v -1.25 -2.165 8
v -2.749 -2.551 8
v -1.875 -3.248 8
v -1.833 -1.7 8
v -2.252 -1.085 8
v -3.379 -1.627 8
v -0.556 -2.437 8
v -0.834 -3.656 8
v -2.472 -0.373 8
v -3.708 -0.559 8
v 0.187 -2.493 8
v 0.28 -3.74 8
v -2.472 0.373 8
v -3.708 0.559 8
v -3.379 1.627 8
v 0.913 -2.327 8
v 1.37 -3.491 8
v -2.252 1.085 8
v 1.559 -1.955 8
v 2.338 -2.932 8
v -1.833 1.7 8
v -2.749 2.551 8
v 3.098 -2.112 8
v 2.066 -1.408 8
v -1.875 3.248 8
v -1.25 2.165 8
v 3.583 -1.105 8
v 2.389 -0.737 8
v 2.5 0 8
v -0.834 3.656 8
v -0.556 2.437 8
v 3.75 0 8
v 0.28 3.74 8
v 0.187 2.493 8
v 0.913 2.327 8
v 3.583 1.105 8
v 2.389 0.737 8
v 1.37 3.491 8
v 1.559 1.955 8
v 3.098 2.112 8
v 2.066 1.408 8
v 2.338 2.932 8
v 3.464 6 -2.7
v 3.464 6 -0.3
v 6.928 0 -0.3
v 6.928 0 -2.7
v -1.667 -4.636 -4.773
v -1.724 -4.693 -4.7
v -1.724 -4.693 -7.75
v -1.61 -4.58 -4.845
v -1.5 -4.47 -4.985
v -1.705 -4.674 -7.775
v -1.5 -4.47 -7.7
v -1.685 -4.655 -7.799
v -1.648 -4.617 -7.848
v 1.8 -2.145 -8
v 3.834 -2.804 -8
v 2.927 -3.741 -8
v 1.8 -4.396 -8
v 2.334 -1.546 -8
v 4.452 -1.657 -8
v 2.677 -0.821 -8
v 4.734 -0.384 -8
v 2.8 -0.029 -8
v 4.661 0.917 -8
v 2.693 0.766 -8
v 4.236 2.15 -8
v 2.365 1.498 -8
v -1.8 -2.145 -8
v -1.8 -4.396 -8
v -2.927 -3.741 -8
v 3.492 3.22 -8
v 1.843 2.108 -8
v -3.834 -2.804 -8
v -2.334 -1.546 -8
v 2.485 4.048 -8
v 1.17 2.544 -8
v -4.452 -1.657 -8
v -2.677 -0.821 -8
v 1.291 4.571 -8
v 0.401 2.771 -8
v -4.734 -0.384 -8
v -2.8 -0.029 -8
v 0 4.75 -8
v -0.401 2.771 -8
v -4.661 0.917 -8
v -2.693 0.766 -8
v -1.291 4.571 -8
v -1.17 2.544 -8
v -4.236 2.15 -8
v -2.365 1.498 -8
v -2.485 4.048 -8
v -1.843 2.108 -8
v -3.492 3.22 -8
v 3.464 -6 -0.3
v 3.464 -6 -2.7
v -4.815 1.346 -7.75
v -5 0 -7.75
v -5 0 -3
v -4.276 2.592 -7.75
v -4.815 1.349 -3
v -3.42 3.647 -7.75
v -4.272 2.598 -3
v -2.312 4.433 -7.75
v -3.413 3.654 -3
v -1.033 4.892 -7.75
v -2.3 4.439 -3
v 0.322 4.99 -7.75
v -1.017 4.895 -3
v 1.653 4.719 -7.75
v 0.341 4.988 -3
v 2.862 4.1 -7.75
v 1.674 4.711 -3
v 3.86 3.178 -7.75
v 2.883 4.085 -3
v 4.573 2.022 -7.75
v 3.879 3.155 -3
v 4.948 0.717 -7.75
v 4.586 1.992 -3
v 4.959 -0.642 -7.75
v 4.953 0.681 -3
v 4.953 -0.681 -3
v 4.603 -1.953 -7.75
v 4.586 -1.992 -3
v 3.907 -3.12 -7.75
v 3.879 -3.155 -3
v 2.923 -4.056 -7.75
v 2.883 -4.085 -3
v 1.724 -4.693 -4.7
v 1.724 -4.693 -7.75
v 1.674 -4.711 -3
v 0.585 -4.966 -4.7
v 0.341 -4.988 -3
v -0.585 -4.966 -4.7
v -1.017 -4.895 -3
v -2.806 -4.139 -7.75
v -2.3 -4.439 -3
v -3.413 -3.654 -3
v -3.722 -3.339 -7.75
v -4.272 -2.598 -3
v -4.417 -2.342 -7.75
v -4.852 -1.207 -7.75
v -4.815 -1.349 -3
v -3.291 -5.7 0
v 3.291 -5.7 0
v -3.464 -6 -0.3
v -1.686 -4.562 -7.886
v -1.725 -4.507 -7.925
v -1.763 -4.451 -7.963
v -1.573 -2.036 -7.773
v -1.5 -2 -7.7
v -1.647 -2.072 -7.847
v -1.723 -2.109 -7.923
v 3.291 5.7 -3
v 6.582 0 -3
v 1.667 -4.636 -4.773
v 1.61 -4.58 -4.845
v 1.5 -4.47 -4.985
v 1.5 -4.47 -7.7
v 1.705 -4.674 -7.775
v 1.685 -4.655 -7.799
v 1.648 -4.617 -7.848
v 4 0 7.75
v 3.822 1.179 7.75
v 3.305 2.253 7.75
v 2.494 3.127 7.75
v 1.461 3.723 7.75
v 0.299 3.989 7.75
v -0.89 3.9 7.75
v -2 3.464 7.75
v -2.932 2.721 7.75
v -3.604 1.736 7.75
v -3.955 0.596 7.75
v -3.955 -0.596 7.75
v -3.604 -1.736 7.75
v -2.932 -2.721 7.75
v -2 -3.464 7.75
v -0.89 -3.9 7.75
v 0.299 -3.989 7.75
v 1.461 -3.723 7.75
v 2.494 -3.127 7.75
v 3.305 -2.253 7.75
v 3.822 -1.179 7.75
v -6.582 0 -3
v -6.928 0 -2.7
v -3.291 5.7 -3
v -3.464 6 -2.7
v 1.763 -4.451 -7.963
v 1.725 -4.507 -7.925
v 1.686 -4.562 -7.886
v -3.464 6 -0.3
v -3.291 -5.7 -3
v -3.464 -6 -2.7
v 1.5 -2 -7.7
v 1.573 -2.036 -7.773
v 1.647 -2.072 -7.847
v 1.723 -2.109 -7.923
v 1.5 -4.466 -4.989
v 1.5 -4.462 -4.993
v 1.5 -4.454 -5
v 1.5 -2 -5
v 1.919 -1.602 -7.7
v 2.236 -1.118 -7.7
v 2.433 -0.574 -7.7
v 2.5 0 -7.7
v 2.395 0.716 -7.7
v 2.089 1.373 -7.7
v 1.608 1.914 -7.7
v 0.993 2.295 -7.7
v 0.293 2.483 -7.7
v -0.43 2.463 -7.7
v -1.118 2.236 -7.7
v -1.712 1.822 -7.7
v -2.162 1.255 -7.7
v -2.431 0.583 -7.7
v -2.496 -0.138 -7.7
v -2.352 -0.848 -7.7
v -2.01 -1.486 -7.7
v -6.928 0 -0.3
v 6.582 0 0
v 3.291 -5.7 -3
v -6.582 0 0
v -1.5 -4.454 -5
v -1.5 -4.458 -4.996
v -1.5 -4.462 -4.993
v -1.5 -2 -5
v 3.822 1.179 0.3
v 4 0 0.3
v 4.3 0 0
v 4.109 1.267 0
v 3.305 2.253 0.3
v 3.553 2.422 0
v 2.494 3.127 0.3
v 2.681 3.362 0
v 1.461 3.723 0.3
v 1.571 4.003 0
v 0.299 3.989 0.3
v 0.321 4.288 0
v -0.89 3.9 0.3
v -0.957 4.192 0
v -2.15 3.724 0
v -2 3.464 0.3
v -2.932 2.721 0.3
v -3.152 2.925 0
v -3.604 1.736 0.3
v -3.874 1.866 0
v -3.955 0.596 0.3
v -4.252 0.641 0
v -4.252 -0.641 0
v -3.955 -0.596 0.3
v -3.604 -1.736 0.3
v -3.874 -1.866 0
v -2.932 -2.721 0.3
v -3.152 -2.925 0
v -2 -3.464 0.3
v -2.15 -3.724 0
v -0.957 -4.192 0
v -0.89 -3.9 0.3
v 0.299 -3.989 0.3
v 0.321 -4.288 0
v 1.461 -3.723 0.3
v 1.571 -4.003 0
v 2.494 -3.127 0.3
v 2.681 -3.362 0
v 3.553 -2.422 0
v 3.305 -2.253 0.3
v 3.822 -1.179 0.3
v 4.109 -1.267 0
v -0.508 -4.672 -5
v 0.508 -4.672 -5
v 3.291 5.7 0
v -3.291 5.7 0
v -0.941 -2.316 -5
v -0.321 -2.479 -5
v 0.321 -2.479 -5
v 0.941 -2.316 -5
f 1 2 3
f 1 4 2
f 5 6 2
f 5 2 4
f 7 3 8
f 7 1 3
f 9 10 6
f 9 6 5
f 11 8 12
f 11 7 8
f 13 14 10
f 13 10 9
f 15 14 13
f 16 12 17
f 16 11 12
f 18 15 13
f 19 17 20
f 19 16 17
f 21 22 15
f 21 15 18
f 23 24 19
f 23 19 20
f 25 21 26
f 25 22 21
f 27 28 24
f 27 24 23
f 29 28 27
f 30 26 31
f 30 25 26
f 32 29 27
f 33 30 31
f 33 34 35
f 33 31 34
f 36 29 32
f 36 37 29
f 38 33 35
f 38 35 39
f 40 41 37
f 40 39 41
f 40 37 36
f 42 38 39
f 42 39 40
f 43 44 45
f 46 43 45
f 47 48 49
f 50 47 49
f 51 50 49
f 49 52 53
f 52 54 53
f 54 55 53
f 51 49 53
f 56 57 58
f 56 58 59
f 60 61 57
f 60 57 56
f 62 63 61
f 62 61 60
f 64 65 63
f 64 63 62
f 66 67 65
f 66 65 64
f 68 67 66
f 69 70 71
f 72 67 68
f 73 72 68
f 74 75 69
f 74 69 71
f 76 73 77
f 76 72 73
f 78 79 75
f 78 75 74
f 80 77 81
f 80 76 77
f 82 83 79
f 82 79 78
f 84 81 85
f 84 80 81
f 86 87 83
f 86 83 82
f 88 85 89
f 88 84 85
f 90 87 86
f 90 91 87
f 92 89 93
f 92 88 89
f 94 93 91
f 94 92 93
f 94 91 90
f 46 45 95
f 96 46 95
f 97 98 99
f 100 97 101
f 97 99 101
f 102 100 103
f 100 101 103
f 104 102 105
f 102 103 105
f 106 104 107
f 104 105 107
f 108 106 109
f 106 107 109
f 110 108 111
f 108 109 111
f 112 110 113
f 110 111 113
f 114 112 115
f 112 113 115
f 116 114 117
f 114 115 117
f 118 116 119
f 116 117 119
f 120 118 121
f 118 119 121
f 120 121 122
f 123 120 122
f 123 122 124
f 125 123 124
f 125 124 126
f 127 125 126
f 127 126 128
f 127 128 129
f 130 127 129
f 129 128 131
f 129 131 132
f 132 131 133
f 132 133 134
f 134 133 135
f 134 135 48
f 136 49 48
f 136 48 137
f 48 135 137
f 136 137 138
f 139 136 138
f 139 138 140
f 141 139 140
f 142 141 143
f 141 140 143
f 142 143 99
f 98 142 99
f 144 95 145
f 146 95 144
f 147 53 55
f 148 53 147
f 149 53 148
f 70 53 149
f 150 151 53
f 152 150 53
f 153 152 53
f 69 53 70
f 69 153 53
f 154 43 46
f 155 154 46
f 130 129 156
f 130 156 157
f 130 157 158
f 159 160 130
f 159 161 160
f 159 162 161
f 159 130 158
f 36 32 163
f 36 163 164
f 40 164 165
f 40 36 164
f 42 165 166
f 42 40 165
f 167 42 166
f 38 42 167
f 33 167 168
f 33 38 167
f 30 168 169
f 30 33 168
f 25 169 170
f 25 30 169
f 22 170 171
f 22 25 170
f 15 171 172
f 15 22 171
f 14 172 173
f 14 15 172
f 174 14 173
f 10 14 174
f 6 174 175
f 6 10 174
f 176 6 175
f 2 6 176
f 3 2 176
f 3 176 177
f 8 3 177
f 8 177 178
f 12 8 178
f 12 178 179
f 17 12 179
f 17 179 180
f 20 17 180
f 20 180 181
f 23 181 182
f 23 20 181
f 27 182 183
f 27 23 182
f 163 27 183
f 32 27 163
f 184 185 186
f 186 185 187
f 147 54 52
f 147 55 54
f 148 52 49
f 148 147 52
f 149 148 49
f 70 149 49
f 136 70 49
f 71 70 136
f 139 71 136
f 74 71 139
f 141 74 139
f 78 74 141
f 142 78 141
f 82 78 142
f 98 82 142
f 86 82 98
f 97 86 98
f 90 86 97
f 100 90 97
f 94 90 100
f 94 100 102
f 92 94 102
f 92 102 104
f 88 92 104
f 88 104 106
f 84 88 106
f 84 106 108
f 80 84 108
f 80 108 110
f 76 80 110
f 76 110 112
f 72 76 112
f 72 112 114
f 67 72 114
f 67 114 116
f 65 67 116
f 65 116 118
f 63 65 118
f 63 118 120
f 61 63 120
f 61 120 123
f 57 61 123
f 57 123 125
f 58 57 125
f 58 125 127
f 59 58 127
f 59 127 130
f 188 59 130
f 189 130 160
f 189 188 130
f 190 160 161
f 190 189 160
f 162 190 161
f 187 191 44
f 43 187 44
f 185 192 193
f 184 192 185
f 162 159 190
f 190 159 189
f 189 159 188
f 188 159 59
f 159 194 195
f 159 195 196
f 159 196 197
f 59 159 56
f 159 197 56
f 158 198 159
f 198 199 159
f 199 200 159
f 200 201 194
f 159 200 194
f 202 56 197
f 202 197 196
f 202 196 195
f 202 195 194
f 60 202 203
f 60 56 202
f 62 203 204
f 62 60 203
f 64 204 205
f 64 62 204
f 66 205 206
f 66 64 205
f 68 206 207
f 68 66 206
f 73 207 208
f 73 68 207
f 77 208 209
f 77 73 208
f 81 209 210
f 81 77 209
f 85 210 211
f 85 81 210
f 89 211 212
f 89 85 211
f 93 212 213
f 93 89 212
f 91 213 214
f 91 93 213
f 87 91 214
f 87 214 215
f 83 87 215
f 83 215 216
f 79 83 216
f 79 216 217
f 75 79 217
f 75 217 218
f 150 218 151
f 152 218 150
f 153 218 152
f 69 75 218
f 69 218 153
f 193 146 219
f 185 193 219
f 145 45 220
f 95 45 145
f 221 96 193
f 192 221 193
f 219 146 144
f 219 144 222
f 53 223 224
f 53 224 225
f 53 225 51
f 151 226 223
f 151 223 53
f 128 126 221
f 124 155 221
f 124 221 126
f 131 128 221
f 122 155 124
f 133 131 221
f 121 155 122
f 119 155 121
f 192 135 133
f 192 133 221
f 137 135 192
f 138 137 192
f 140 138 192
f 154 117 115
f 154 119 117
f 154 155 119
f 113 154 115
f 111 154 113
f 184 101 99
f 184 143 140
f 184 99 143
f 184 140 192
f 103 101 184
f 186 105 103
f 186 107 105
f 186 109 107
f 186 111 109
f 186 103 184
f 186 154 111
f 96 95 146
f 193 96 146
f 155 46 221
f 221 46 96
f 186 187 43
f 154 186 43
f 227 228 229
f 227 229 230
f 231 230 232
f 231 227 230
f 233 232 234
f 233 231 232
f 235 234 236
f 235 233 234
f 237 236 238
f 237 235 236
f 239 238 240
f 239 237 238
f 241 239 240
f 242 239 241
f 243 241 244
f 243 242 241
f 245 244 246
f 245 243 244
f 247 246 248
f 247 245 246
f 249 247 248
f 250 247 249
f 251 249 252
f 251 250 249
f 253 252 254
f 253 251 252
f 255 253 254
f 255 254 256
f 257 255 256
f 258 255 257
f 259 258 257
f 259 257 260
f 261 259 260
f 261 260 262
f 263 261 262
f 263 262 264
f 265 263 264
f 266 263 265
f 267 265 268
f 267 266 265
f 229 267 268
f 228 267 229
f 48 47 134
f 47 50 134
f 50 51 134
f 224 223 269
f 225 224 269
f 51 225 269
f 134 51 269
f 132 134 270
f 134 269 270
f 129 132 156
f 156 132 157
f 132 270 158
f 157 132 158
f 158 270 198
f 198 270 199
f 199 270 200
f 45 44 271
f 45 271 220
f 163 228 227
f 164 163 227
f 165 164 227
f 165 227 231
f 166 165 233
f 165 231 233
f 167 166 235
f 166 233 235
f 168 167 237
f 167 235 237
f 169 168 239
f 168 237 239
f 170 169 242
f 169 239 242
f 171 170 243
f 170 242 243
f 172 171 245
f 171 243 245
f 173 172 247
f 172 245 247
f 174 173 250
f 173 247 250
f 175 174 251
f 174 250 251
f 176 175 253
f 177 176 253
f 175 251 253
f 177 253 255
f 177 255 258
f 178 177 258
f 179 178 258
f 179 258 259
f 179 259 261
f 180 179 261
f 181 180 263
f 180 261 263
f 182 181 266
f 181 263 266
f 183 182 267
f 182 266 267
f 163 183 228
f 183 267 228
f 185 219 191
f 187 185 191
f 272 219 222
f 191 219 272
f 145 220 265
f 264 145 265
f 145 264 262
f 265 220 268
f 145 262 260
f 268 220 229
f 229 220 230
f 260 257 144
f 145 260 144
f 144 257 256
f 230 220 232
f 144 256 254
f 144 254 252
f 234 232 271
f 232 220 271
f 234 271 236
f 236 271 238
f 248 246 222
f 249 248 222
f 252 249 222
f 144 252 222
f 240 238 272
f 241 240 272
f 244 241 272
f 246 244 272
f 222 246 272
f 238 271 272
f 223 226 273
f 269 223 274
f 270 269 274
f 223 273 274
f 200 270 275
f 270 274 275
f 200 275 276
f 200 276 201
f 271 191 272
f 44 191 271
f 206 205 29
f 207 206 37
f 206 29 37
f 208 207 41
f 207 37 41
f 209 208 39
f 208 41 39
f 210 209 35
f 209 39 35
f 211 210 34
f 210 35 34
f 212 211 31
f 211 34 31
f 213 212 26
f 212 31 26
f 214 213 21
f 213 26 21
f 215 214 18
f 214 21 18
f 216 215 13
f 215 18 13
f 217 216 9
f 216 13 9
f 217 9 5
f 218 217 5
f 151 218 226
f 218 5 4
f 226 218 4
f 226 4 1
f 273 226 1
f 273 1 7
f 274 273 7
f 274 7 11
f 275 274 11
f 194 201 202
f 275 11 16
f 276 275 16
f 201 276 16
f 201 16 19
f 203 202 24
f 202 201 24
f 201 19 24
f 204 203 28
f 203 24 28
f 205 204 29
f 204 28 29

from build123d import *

# Parameters (mm, degrees)
SKETCH1_R           = 4
BOSS_EXTRUDE1_DEPTH = 8
BOSS_EXTRUDE2_DEPTH = 3
SKETCH3_R           = 5
BOSS_EXTRUDE3_DEPTH = 5
SKETCH4_R           = 2.5
CUT_EXTRUDE1_DEPTH  = 19.439088915
CHAMFER1_SIZE       = 0.3
CHAMFER2_SIZE       = 0.3
SKETCH5_W           = 3
SKETCH5_H           = 3
CUT_EXTRUDE2_DEPTH  = 13.165525061
CHAMFER3_SIZE       = 0.3
CHAMFER4_SIZE       = 0.3
CHAMFER5_SIZE       = 0.25


with BuildPart() as part:
    # Sketch1 → Boss-Extrude1 (new body)
    with BuildSketch(Plane.XY):
        Circle(SKETCH1_R)
    extrude(amount=BOSS_EXTRUDE1_DEPTH)

    # Sketch2 → Boss-Extrude2 (add)
    with BuildSketch(Plane(origin=(0, 0, 0), x_dir=(-1, 0, 0), z_dir=(0, 0, -1))):
        Polygon((-3.464101615, 6), (-6.92820323, 0), (-3.464101615, -6), (3.464101615, -6), (6.92820323, 0), (3.464101615, 6), align=None)
    extrude(amount=BOSS_EXTRUDE2_DEPTH)

    # Sketch3 → Boss-Extrude3 (add)
    with BuildSketch(Plane(origin=(0, 0, -3), x_dir=(-1, 0, 0), z_dir=(0, 0, -1))):
        Circle(SKETCH3_R)
    extrude(amount=BOSS_EXTRUDE3_DEPTH)

    # Sketch4 → Cut-Extrude1 (cut, through all)
    with BuildSketch(Plane.XY.offset(8)):
        Circle(SKETCH4_R)
    extrude(amount=-CUT_EXTRUDE1_DEPTH, mode=Mode.SUBTRACT)

    # Chamfer1
    chamfer1_edges = [part.edges().sort_by_distance(p)[0] for p in [
        (-4, 0, 0),
    ]]
    chamfer(chamfer1_edges, length=CHAMFER1_SIZE)

    # Chamfer2
    chamfer2_edges = [part.edges().sort_by_distance(p)[0] for p in [
        (-2.5, 0, -8),
    ]]
    chamfer(chamfer2_edges, length=CHAMFER2_SIZE)

    # Sketch5 → Cut-Extrude2 (cut, through all)
    with BuildSketch(Plane(origin=(0, 0, 0), x_dir=(1, 0, 0), z_dir=(0, 1, 0))):
        with Locations((0, 6.5)):
            Rectangle(SKETCH5_W, SKETCH5_H)
    extrude(amount=-CUT_EXTRUDE2_DEPTH, mode=Mode.SUBTRACT)

    # Chamfer3
    chamfer3_edges = [part.edges().sort_by_distance(p)[0] for p in [
        (-5.196152423, 3, -3),
        (0, 6, 0),
        (5.196152423, 3, 0),
        (5.196152423, -3, 0),
        (0, -6, 0),
        (-5.196152423, -3, 0),
        (-5.196152423, 3, 0),
        (0, 6, -3),
        (5.196152423, 3, -3),
        (5.196152423, -3, -3),
        (0, -6, -3),
        (-5.196152423, -3, -3),
    ]]
    chamfer(chamfer3_edges, length=CHAMFER3_SIZE)

    # Chamfer4
    # the kernel refuses this chamfer: 0.3, 0.239246049 mm, written as the material it takes off along each edge
    with BuildSketch(Plane(origin=(1.5, -1.592813187, -8), x_dir=(0, 0, 1), z_dir=(0, -1, 0))) as chamfer4_piece_1:
        Polygon((CHAMFER4_SIZE, 0), (0, -CHAMFER4_SIZE), (0, 0), align=None)
    extrude(amount=3.948387716, mode=Mode.SUBTRACT)
    with BuildSketch(Plane(origin=(-1.5, -1.592813187, -8), x_dir=(0, 0, 1), z_dir=(0, -1, 0))) as chamfer4_piece_2:
        Polygon((CHAMFER4_SIZE, 0), (0, CHAMFER4_SIZE), (0, 0), align=None)
    extrude(amount=3.948387716, mode=Mode.SUBTRACT)
    with BuildSketch(Plane(origin=(0, 0, -5), x_dir=(-0.44305448610570786, -0.8964946861758898, 0), z_dir=(-0.8964946861758898, 0.44305448610570786, 0))) as chamfer4_piece_3_section:
        Polygon((5, CHAMFER4_SIZE), (5 - CHAMFER4_SIZE, 0), (5, 0), align=None)
    chamfer4_piece_3 = revolve(axis=Axis((0, 0, -5), (0, 0, 1)), revolution_arc=52.597864763, mode=Mode.PRIVATE)
    chamfer4_piece_3 = split(chamfer4_piece_3, bisect_by=Plane(origin=(1.5, 0, -5), z_dir=(-1, 0, 0)), keep=Keep.TOP, mode=Mode.PRIVATE)
    chamfer4_piece_3 = split(chamfer4_piece_3, bisect_by=Plane(origin=(-1.5, 0, -5), z_dir=(1, 0, 0)), keep=Keep.TOP, mode=Mode.PRIVATE)
    add(chamfer4_piece_3, mode=Mode.SUBTRACT)
    with BuildSketch(Plane(origin=(-1.5, -4.769696007, -8.771504896), x_dir=(-0.946580683310887, 0.32246706805919617, 0), z_dir=(0, 0, 1))) as chamfer4_piece_4:
        with BuildLine():
            Line((0.236397724, 0), (CHAMFER4_SIZE * 0.322467068059, -CHAMFER4_SIZE * 0.946580683311))
            Line((CHAMFER4_SIZE * 0.322467068059, -CHAMFER4_SIZE * 0.946580683311), (0, 0))
            ThreePointArc((0, 0), (0.120844642, 0.001396592), (0.236397724, 0))
        make_face()
    extrude(amount=3.771504896, mode=Mode.SUBTRACT)
    with BuildSketch(Plane(origin=(1.5, -4.769696007, -8.771504896), x_dir=(0.9465806833108867, 0.32246706805919695, 0), z_dir=(0, 0, 1))) as chamfer4_piece_5:
        with BuildLine():
            Line((0.236397724, 0), (CHAMFER4_SIZE * 0.322467068059, CHAMFER4_SIZE * 0.946580683311))
            Line((CHAMFER4_SIZE * 0.322467068059, CHAMFER4_SIZE * 0.946580683311), (0, 0))
            ThreePointArc((0, 0), (0.120844642, -0.001396592), (0.236397724, 0))
        make_face()
    extrude(amount=3.771504896, mode=Mode.SUBTRACT)
    with BuildSketch(Plane(origin=(-1.5, -4.769696007, -8.771504896), x_dir=(-0.946580683310887, 0.32246706805919617, 0), z_dir=(0, 0, 1))) as chamfer4_piece_6a_section:
        with BuildLine():
            Line((0.236397724, 0), (CHAMFER4_SIZE * 0.322467068059, -CHAMFER4_SIZE * 0.946580683311))
            Line((CHAMFER4_SIZE * 0.322467068059, -CHAMFER4_SIZE * 0.946580683311), (0, 0))
            ThreePointArc((0, 0), (0.120844642, 0.001396592), (0.236397724, 0))
        make_face()
    chamfer4_piece_6a = extrude(amount=4.543009793, mode=Mode.PRIVATE)
    chamfer4_piece_6a = split(chamfer4_piece_6a, bisect_by=Plane(origin=(-1.5, -4.769696007, -5), z_dir=(0, 0, 1)), keep=Keep.TOP, mode=Mode.PRIVATE)
    with BuildSketch(Plane(origin=(0, 0, -5), x_dir=(-0.44305448610570786, -0.8964946861758898, 0), z_dir=(-0.8964946861758898, 0.44305448610570786, 0))) as chamfer4_piece_6b_section:
        Polygon((5, CHAMFER4_SIZE), (5 - CHAMFER4_SIZE, 0), (5, 0), align=None)
    chamfer4_piece_6b = revolve(axis=Axis((0, 0, -5), (0, 0, 1)), revolution_arc=52.597864763, mode=Mode.PRIVATE)
    chamfer4_piece_6b = split(chamfer4_piece_6b, bisect_by=Plane(origin=(-1.5, 0, -5), z_dir=(-1, 0, 0)), keep=Keep.TOP, mode=Mode.PRIVATE)
    chamfer4_piece_6 = chamfer4_piece_6a & chamfer4_piece_6b
    add(chamfer4_piece_6, mode=Mode.SUBTRACT)
    with BuildSketch(Plane(origin=(0, 0, -5), x_dir=(-0.44305448610570786, -0.8964946861758898, 0), z_dir=(-0.8964946861758898, 0.44305448610570786, 0))) as chamfer4_piece_7a_section:
        Polygon((5, CHAMFER4_SIZE), (5 - CHAMFER4_SIZE, 0), (5, 0), align=None)
    chamfer4_piece_7a = revolve(axis=Axis((0, 0, -5), (0, 0, 1)), revolution_arc=52.597864763, mode=Mode.PRIVATE)
    chamfer4_piece_7a = split(chamfer4_piece_7a, bisect_by=Plane(origin=(1.5, 0, -5), z_dir=(1, 0, 0)), keep=Keep.TOP, mode=Mode.PRIVATE)
    with BuildSketch(Plane(origin=(1.5, -4.769696007, -8.771504896), x_dir=(0.9465806833108867, 0.32246706805919695, 0), z_dir=(0, 0, 1))) as chamfer4_piece_7b_section:
        with BuildLine():
            Line((0.236397724, 0), (CHAMFER4_SIZE * 0.322467068059, CHAMFER4_SIZE * 0.946580683311))
            Line((CHAMFER4_SIZE * 0.322467068059, CHAMFER4_SIZE * 0.946580683311), (0, 0))
            ThreePointArc((0, 0), (0.120844642, -0.001396592), (0.236397724, 0))
        make_face()
    chamfer4_piece_7b = extrude(amount=4.543009793, mode=Mode.PRIVATE)
    chamfer4_piece_7b = split(chamfer4_piece_7b, bisect_by=Plane(origin=(1.5, -4.769696007, -5), z_dir=(0, 0, 1)), keep=Keep.TOP, mode=Mode.PRIVATE)
    chamfer4_piece_7 = chamfer4_piece_7a & chamfer4_piece_7b
    add(chamfer4_piece_7, mode=Mode.SUBTRACT)

    # Chamfer5
    chamfer5_edges = [part.edges().sort_by_distance(p)[0] for p in [
        (2.828427125, 4.123105626, -8),
        (-4, 0, 8),
    ]]
    chamfer(chamfer5_edges, length=CHAMFER5_SIZE)


solid = part.part
